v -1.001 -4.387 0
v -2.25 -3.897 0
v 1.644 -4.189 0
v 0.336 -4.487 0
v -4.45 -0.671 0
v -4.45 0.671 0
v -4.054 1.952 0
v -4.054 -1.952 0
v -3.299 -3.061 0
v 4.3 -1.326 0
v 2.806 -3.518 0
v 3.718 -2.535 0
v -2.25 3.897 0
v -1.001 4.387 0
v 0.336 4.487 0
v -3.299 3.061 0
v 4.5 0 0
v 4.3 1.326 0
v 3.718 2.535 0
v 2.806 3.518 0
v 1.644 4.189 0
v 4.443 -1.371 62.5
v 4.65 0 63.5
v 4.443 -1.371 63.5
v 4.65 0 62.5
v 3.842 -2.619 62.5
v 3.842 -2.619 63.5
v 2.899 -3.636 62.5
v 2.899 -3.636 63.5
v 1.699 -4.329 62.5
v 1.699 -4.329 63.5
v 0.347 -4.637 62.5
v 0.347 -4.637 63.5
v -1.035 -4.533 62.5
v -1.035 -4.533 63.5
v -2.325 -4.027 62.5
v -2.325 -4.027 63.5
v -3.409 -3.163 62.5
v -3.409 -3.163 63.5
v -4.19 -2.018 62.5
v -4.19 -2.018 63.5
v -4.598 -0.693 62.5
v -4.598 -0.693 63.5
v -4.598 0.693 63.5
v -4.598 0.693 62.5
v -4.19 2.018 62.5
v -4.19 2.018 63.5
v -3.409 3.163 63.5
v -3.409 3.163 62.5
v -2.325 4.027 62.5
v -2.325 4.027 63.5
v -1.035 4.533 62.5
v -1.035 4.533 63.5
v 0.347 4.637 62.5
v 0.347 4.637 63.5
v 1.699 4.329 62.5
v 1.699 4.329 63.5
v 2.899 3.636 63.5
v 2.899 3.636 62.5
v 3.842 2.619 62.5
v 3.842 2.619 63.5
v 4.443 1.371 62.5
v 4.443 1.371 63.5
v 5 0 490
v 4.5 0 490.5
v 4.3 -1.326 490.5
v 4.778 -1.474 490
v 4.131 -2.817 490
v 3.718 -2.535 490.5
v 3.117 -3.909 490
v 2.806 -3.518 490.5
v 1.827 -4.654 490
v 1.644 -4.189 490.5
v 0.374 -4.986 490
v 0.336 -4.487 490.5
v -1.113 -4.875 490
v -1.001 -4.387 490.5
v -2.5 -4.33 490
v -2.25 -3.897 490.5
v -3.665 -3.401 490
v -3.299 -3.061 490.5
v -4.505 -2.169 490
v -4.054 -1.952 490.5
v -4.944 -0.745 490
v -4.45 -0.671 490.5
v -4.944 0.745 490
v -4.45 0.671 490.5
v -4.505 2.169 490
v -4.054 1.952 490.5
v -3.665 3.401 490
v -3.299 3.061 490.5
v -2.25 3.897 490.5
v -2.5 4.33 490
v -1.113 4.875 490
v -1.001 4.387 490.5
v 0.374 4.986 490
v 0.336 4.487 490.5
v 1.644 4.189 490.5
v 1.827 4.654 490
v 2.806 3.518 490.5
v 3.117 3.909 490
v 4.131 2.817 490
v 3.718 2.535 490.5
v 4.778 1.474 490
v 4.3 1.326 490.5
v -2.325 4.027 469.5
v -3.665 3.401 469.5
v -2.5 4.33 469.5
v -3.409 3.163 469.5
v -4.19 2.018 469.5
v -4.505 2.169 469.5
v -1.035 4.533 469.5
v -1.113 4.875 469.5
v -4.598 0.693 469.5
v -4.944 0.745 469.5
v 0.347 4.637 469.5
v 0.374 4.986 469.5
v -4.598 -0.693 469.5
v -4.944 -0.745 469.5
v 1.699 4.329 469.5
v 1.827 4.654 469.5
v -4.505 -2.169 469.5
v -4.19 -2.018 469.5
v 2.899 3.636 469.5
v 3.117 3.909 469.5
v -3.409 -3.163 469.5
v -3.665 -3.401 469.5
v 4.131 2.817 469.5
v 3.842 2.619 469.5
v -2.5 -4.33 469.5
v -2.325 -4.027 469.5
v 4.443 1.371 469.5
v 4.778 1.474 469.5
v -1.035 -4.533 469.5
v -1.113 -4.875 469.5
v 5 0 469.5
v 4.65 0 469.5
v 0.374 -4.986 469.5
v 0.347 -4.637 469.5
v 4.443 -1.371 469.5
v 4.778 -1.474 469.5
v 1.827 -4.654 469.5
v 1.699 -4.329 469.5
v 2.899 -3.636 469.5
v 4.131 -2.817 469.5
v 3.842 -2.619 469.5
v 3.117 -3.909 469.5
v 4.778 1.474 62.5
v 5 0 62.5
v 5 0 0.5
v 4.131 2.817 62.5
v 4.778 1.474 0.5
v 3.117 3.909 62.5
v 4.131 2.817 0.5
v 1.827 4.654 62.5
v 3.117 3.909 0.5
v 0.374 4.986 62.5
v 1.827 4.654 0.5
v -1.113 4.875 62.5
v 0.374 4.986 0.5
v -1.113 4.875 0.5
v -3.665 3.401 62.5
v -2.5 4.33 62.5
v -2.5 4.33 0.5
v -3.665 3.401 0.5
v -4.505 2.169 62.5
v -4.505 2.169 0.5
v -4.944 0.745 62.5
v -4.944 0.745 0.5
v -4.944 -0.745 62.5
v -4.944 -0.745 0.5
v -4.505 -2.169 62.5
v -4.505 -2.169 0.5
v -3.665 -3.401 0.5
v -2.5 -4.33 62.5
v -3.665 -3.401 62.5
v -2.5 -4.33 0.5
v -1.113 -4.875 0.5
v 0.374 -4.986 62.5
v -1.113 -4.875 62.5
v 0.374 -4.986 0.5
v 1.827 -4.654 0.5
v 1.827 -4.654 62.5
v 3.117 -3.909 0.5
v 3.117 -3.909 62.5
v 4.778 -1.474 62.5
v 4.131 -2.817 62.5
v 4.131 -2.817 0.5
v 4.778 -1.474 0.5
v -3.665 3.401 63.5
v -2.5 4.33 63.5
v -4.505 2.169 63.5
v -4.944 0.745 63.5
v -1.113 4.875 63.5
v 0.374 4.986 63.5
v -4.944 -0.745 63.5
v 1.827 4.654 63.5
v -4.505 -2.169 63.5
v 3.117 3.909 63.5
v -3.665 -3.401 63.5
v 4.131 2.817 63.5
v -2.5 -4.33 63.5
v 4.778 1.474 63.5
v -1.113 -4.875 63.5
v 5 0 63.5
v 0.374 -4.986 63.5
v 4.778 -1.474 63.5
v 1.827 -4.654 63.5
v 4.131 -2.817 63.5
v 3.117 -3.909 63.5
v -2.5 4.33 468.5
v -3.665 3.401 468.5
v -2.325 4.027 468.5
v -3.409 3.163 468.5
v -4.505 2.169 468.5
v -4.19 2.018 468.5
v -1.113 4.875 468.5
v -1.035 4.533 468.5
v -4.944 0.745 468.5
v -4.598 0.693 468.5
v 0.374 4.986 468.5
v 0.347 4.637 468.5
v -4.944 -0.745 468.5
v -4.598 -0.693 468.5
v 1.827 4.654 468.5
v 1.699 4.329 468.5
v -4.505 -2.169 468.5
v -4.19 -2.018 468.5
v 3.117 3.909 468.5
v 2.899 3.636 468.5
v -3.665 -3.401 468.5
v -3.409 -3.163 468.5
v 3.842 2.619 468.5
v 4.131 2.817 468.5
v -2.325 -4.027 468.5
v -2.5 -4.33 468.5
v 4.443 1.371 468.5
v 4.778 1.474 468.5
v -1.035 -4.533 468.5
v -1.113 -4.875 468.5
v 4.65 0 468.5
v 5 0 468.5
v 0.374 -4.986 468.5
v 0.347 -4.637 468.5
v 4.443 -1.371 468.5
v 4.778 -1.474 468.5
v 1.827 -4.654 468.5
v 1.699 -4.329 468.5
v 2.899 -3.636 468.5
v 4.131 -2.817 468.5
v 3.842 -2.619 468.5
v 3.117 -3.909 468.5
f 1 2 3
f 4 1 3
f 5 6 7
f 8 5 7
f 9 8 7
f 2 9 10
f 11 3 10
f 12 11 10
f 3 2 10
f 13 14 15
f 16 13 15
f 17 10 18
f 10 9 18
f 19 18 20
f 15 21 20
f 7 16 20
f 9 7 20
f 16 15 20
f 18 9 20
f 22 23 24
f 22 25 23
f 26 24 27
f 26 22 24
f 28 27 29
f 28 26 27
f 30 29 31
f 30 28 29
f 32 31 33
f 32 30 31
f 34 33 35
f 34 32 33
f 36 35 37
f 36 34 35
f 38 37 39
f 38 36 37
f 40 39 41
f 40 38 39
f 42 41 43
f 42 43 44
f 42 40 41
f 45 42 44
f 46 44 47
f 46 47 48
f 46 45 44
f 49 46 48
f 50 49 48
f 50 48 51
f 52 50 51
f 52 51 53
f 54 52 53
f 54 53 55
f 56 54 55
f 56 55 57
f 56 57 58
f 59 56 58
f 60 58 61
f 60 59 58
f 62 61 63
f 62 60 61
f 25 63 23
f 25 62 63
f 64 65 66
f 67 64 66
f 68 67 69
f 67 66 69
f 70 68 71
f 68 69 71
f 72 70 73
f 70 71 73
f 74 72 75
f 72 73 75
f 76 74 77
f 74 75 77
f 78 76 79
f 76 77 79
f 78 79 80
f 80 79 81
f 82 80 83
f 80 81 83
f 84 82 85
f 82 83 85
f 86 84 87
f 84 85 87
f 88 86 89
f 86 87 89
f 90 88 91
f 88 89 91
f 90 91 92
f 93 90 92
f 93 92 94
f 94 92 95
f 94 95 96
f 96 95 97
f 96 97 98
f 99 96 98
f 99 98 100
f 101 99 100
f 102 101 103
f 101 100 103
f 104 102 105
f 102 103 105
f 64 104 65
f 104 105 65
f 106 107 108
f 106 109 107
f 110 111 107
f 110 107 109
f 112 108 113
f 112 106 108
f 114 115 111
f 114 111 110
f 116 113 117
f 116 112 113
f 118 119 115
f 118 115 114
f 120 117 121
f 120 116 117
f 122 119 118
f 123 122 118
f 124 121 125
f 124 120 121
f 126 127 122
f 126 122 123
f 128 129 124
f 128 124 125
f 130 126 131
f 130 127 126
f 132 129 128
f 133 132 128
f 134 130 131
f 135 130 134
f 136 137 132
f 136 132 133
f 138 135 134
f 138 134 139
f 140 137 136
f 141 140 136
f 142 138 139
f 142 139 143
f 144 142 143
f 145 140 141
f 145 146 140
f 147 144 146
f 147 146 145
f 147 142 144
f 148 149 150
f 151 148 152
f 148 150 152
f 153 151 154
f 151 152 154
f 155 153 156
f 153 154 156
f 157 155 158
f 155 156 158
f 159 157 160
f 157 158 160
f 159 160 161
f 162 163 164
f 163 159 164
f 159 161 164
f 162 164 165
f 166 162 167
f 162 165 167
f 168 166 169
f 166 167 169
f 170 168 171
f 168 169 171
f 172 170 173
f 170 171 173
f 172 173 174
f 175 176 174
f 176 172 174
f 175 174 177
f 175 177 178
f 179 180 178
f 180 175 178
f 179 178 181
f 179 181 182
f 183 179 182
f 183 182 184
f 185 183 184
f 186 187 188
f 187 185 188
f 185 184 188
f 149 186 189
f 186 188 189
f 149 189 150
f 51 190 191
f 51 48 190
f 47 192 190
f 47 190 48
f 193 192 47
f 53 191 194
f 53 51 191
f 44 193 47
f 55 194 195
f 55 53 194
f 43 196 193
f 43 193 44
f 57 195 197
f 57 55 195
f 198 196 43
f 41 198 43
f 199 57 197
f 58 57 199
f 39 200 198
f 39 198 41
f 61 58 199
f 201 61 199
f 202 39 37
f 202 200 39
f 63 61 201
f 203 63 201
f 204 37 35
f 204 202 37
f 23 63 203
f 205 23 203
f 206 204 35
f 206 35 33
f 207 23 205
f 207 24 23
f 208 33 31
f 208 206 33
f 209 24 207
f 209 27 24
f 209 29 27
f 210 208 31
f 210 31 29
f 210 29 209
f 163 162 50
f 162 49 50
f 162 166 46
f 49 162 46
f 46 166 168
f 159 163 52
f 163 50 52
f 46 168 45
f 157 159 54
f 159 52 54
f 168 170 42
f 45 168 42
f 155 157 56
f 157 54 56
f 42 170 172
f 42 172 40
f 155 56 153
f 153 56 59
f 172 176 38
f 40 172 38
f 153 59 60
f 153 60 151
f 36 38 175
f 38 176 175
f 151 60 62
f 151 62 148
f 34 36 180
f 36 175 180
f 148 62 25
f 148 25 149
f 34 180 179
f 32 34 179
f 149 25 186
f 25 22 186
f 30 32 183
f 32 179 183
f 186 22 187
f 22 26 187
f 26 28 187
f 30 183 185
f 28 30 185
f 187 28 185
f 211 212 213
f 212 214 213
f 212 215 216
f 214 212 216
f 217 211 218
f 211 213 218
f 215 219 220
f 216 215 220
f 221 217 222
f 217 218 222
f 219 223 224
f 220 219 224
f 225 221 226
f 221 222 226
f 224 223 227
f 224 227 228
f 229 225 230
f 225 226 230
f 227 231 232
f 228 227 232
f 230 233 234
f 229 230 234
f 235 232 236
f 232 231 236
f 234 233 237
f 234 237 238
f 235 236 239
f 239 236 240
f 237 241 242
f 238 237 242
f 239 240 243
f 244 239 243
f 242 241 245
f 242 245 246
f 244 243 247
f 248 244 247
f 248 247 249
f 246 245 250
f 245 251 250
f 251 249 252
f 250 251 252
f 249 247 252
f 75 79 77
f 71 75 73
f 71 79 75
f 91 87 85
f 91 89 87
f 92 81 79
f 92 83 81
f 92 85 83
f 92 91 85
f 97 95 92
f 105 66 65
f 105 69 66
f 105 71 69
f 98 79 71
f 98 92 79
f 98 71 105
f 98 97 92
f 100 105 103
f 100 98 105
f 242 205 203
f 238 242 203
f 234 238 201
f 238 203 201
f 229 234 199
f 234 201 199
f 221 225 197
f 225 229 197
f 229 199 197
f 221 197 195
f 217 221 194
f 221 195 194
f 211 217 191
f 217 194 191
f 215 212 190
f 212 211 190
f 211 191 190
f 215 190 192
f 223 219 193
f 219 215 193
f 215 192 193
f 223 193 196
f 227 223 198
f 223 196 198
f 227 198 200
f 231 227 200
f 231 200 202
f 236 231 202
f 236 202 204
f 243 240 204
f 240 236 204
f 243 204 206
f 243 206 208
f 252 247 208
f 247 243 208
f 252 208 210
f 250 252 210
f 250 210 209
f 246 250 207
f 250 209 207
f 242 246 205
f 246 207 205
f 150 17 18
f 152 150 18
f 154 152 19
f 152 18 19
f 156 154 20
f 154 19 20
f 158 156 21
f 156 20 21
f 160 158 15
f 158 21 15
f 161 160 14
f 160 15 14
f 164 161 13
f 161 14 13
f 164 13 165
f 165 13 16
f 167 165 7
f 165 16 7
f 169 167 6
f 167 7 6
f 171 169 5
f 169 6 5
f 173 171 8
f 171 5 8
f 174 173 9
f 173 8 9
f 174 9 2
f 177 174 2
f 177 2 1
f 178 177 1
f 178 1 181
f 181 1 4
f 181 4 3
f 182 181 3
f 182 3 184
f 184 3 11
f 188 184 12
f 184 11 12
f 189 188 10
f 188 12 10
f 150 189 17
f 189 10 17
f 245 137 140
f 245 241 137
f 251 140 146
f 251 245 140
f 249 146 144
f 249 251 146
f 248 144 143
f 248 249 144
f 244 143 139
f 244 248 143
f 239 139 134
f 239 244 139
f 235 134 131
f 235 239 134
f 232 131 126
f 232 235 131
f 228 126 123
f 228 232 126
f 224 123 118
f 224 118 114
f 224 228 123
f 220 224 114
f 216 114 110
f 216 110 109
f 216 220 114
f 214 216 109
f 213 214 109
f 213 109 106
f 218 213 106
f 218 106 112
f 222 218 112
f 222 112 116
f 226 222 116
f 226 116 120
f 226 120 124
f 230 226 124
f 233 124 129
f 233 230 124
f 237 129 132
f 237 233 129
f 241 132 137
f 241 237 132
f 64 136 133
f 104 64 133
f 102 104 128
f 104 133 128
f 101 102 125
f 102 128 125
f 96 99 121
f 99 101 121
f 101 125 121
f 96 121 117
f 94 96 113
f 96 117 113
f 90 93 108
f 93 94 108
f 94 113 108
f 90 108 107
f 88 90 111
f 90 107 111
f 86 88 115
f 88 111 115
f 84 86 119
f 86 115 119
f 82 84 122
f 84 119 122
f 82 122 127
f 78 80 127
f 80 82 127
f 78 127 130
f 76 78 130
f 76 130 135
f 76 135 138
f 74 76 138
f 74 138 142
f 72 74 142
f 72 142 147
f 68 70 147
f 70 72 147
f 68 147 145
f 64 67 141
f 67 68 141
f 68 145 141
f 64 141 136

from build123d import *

# Parameters (mm, degrees)
SKETCH_1_R          = 5
EXTRUDE_1_DEPTH     = 532
SKETCH_2_W          = 3.43195358
SKETCH_2_H          = 1
SKETCH_2_W_2        = 4.632623125
CHAMFER_1_SIZE      = 0.5
SKETCH_3_W          = 38.697285924
SKETCH_3_H          = 59.202017993
CUT_EXTRUDE_1_DEPTH = 10
CHAMFER_2_SIZE      = 0.5


with BuildPart() as part:
    # 草图1 → 拉伸1 (new body)
    with BuildSketch(Plane.XY):
        Circle(SKETCH_1_R)
    extrude(amount=EXTRUDE_1_DEPTH)

    # 草图2 → 切除-旋转2 (revolve, cut)
    with BuildSketch(Plane(origin=(0, 0, 0), x_dir=(1, 0, 0), z_dir=(0, 1, 0)), mode=Mode.PRIVATE) as cut_revolve_2_sk:
        with Locations((-6.36597679, -469)):
            Rectangle(SKETCH_2_W, SKETCH_2_H)
        with Locations((-6.966311563, -63)):
            Rectangle(SKETCH_2_W_2, SKETCH_2_H)
    revolve(cut_revolve_2_sk.sketch.rotate(Axis((0, 0, 532), (0, 0, -1)), 180), axis=Axis((0, 0, 532), (0, 0, -1)), mode=Mode.SUBTRACT)

    # 倒角1
    chamfer_1_edges = [part.edges().sort_by_distance(p)[0] for p in [
        (-5, 0, 0),
        (-5, 0, 532),
    ]]
    chamfer(chamfer_1_edges, length=CHAMFER_1_SIZE)

    # 草图3 → 切除-拉伸1 (cut, symmetric)
    with BuildSketch(Plane(origin=(0, 0, 0), x_dir=(1, 0, 0), z_dir=(0, 1, 0))):
        with Locations((7.437997044, -520.101008997)):
            Rectangle(SKETCH_3_W, SKETCH_3_H)
    extrude(amount=CUT_EXTRUDE_1_DEPTH, both=True, mode=Mode.SUBTRACT)

    # 倒角2
    chamfer_2_edges = [part.edges().sort_by_distance(p)[0] for p in [
        (-5, 0, 490.5),
    ]]
    chamfer(chamfer_2_edges, length=CHAMFER_2_SIZE)


solid = part.part
